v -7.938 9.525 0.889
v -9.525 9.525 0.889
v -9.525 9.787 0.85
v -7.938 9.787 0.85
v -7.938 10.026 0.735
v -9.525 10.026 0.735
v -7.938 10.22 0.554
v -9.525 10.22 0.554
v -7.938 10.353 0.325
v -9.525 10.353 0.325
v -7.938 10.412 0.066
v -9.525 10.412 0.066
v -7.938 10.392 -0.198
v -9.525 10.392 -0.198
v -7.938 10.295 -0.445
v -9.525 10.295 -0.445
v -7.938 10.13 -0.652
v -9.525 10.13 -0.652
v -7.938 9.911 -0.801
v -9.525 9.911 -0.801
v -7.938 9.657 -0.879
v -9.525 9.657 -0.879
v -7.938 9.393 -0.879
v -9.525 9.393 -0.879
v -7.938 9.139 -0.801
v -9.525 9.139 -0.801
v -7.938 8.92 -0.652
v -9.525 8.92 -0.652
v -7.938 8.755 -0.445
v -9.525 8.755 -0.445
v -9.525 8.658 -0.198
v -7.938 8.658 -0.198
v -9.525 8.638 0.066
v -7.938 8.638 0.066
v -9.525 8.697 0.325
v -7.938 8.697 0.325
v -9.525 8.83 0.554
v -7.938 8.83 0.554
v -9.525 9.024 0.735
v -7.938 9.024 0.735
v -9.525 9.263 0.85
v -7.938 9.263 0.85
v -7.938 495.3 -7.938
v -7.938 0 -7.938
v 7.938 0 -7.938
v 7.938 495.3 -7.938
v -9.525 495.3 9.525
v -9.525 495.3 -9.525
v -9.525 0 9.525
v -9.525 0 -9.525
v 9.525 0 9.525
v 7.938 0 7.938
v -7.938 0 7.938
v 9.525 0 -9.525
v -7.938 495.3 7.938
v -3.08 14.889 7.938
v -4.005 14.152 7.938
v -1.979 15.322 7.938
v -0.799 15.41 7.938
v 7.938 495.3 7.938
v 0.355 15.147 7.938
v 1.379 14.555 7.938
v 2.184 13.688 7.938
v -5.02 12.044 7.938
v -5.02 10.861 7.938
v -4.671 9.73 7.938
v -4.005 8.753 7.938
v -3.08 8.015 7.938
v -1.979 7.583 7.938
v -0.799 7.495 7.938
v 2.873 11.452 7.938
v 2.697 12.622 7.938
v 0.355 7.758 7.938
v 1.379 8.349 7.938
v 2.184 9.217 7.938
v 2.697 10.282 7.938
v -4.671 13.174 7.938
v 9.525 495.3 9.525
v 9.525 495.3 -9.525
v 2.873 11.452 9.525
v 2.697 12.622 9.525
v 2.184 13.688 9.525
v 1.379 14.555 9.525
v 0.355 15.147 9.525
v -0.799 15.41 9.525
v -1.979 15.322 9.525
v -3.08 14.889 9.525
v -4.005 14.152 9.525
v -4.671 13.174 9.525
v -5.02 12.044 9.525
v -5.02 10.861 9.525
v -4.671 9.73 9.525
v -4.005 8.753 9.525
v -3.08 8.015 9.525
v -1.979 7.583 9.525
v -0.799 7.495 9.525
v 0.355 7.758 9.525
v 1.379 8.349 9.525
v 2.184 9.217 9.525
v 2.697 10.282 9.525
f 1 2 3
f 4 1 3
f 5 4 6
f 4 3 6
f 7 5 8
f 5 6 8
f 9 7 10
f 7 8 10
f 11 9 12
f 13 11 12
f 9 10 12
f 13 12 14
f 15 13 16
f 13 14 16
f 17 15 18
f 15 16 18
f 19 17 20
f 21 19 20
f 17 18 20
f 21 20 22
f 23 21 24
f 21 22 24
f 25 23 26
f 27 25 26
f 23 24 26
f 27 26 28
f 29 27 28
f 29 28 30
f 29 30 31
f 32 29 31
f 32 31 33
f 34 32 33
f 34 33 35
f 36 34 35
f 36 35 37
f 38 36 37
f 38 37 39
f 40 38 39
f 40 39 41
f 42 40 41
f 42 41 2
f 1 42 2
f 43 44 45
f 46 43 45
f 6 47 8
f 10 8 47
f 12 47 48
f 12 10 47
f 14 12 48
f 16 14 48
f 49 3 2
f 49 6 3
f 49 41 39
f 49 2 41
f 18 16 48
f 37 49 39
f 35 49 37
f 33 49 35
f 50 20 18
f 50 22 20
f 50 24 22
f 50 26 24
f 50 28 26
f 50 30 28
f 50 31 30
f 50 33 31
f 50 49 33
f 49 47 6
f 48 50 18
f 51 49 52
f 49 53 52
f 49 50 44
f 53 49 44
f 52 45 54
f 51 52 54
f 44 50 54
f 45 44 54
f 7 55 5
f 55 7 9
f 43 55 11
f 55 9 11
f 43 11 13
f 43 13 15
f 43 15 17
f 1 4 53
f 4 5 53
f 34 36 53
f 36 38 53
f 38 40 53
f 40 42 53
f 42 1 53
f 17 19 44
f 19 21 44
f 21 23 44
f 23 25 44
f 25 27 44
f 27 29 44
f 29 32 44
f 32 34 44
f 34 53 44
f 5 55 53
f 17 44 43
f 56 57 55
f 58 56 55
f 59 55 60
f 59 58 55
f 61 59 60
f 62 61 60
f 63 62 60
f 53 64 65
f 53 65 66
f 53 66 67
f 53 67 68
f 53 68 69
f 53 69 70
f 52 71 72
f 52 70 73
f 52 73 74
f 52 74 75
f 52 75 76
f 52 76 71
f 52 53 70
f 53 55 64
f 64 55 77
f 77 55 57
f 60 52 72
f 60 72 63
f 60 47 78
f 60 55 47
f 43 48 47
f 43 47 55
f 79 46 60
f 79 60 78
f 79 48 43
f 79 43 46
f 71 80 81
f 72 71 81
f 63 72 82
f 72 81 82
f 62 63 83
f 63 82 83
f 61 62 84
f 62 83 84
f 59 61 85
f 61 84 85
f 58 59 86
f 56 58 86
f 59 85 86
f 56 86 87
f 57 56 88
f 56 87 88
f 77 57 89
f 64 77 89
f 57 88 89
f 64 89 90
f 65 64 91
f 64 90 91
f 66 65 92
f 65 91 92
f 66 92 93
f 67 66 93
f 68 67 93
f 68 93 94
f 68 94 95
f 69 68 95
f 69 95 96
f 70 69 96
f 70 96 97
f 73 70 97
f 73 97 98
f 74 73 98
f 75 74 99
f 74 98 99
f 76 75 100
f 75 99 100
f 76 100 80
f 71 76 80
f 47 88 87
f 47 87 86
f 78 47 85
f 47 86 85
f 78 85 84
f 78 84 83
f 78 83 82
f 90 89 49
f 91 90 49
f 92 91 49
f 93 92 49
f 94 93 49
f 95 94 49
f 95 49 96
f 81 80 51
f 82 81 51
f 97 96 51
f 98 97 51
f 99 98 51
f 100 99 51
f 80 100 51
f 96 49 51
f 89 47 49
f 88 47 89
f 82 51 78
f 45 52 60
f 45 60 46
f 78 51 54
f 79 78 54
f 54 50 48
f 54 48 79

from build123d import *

# Parameters (mm, degrees)
SKETCH1_W           = 19.05
SKETCH1_H           = 19.05
SKETCH1_W_2         = 15.875
SKETCH1_H_2         = 15.875
BOSS_EXTRUDE1_DEPTH = 495.3
SKETCH2_R           = 3.96875
CUT_EXTRUDE1_DEPTH  = 1.5875
CUT_EXTRUDE2_REACH  = 21.05
SKETCH3_R           = 0.889


with BuildPart() as part:
    # Sketch1 → Boss-Extrude1 (new body)
    with BuildSketch(Plane(origin=(0, 0, 0), x_dir=(1, 0, 0), z_dir=(0, 1, 0))):
        Rectangle(SKETCH1_W, SKETCH1_H)
        Rectangle(SKETCH1_W_2, SKETCH1_H_2, mode=Mode.SUBTRACT)
    extrude(amount=BOSS_EXTRUDE1_DEPTH)

    # Sketch2 → Cut-Extrude1 (cut)
    with BuildSketch(Plane.XY.offset(9.525)):
        with Locations((-1.095375, 11.4523012)):
            Circle(SKETCH2_R)
    extrude(amount=-CUT_EXTRUDE1_DEPTH, mode=Mode.SUBTRACT)

    # Sketch3 → Cut-Extrude2 (cut, up to next)
    with BuildSketch(Plane.ZY.offset(9.525), mode=Mode.PRIVATE) as cut_extrude2_sk1:
        with Locations((0, 9.525)):
            Circle(SKETCH3_R)
    cut_extrude2_tool1 = extrude(cut_extrude2_sk1.sketch, amount=-CUT_EXTRUDE2_REACH, mode=Mode.PRIVATE) & part.part
    add(cut_extrude2_tool1.solids().sort_by_distance((-9.525, 9.525, 0))[0], mode=Mode.SUBTRACT)


solid = part.part
